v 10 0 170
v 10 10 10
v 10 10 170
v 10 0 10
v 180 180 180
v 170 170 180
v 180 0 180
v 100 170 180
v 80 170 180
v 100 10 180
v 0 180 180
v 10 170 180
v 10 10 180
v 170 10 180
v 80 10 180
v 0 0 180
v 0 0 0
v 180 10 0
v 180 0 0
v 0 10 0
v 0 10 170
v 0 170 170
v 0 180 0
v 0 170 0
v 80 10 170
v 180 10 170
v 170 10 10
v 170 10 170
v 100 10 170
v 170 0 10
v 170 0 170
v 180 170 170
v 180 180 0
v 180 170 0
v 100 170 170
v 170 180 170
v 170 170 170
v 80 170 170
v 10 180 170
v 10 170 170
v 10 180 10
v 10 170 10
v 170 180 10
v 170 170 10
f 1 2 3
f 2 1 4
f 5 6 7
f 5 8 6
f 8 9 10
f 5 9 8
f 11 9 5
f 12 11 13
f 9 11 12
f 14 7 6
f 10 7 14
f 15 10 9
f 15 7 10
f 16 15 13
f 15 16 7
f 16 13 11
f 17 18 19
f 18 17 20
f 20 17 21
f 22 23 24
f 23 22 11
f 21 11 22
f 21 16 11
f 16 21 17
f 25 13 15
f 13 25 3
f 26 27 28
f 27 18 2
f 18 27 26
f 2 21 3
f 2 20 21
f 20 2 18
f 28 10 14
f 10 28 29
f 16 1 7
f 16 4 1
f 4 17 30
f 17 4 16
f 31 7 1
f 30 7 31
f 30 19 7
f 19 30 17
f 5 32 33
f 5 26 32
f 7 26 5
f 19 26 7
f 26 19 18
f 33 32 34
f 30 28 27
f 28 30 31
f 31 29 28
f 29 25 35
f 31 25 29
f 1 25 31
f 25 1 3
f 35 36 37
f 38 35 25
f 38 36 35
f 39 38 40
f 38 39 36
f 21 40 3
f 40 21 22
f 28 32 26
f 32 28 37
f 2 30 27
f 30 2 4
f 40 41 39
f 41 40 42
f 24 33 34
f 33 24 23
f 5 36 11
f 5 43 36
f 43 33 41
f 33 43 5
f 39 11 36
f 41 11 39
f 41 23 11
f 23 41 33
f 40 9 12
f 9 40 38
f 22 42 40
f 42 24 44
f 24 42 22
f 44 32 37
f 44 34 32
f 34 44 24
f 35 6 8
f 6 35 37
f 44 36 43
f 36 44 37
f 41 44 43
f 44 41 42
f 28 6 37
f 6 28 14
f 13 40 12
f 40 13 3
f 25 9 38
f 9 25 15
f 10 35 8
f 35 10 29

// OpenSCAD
boxLength = 10;
boxWidth = 10;
boxHeight = 180;

casing();

module casing() {
    union() {
        squareBox();

        translate([0,boxHeight-boxWidth,0]) {
            squareBox();
        }
        
        translate([0,0,boxHeight-boxWidth]) {
            rotate([90,0,90]) {
                squareBox();
            }
        }
        
        supportBeamWidth=20;
        
        //Fix y translate. If the length and width change, the offset will be off.
        translate([boxHeight/2+(supportBeamWidth/2),5,boxHeight]) {
            rotate([0,90,90]) {
                cube([boxLength,supportBeamWidth,boxHeight-boxWidth]);
            }
        }
    }
}


module squareBox() {
    towers();
    translate([0,0,boxHeight]) {
        rotate([0,90,0]) {
            towers();
        }
    }
}

module towers() {
    cube([boxLength,boxWidth,boxHeight]);
    translate([boxHeight-boxWidth,0,0]) {
        cube([boxLength,boxWidth,boxHeight]);
    }
} 
